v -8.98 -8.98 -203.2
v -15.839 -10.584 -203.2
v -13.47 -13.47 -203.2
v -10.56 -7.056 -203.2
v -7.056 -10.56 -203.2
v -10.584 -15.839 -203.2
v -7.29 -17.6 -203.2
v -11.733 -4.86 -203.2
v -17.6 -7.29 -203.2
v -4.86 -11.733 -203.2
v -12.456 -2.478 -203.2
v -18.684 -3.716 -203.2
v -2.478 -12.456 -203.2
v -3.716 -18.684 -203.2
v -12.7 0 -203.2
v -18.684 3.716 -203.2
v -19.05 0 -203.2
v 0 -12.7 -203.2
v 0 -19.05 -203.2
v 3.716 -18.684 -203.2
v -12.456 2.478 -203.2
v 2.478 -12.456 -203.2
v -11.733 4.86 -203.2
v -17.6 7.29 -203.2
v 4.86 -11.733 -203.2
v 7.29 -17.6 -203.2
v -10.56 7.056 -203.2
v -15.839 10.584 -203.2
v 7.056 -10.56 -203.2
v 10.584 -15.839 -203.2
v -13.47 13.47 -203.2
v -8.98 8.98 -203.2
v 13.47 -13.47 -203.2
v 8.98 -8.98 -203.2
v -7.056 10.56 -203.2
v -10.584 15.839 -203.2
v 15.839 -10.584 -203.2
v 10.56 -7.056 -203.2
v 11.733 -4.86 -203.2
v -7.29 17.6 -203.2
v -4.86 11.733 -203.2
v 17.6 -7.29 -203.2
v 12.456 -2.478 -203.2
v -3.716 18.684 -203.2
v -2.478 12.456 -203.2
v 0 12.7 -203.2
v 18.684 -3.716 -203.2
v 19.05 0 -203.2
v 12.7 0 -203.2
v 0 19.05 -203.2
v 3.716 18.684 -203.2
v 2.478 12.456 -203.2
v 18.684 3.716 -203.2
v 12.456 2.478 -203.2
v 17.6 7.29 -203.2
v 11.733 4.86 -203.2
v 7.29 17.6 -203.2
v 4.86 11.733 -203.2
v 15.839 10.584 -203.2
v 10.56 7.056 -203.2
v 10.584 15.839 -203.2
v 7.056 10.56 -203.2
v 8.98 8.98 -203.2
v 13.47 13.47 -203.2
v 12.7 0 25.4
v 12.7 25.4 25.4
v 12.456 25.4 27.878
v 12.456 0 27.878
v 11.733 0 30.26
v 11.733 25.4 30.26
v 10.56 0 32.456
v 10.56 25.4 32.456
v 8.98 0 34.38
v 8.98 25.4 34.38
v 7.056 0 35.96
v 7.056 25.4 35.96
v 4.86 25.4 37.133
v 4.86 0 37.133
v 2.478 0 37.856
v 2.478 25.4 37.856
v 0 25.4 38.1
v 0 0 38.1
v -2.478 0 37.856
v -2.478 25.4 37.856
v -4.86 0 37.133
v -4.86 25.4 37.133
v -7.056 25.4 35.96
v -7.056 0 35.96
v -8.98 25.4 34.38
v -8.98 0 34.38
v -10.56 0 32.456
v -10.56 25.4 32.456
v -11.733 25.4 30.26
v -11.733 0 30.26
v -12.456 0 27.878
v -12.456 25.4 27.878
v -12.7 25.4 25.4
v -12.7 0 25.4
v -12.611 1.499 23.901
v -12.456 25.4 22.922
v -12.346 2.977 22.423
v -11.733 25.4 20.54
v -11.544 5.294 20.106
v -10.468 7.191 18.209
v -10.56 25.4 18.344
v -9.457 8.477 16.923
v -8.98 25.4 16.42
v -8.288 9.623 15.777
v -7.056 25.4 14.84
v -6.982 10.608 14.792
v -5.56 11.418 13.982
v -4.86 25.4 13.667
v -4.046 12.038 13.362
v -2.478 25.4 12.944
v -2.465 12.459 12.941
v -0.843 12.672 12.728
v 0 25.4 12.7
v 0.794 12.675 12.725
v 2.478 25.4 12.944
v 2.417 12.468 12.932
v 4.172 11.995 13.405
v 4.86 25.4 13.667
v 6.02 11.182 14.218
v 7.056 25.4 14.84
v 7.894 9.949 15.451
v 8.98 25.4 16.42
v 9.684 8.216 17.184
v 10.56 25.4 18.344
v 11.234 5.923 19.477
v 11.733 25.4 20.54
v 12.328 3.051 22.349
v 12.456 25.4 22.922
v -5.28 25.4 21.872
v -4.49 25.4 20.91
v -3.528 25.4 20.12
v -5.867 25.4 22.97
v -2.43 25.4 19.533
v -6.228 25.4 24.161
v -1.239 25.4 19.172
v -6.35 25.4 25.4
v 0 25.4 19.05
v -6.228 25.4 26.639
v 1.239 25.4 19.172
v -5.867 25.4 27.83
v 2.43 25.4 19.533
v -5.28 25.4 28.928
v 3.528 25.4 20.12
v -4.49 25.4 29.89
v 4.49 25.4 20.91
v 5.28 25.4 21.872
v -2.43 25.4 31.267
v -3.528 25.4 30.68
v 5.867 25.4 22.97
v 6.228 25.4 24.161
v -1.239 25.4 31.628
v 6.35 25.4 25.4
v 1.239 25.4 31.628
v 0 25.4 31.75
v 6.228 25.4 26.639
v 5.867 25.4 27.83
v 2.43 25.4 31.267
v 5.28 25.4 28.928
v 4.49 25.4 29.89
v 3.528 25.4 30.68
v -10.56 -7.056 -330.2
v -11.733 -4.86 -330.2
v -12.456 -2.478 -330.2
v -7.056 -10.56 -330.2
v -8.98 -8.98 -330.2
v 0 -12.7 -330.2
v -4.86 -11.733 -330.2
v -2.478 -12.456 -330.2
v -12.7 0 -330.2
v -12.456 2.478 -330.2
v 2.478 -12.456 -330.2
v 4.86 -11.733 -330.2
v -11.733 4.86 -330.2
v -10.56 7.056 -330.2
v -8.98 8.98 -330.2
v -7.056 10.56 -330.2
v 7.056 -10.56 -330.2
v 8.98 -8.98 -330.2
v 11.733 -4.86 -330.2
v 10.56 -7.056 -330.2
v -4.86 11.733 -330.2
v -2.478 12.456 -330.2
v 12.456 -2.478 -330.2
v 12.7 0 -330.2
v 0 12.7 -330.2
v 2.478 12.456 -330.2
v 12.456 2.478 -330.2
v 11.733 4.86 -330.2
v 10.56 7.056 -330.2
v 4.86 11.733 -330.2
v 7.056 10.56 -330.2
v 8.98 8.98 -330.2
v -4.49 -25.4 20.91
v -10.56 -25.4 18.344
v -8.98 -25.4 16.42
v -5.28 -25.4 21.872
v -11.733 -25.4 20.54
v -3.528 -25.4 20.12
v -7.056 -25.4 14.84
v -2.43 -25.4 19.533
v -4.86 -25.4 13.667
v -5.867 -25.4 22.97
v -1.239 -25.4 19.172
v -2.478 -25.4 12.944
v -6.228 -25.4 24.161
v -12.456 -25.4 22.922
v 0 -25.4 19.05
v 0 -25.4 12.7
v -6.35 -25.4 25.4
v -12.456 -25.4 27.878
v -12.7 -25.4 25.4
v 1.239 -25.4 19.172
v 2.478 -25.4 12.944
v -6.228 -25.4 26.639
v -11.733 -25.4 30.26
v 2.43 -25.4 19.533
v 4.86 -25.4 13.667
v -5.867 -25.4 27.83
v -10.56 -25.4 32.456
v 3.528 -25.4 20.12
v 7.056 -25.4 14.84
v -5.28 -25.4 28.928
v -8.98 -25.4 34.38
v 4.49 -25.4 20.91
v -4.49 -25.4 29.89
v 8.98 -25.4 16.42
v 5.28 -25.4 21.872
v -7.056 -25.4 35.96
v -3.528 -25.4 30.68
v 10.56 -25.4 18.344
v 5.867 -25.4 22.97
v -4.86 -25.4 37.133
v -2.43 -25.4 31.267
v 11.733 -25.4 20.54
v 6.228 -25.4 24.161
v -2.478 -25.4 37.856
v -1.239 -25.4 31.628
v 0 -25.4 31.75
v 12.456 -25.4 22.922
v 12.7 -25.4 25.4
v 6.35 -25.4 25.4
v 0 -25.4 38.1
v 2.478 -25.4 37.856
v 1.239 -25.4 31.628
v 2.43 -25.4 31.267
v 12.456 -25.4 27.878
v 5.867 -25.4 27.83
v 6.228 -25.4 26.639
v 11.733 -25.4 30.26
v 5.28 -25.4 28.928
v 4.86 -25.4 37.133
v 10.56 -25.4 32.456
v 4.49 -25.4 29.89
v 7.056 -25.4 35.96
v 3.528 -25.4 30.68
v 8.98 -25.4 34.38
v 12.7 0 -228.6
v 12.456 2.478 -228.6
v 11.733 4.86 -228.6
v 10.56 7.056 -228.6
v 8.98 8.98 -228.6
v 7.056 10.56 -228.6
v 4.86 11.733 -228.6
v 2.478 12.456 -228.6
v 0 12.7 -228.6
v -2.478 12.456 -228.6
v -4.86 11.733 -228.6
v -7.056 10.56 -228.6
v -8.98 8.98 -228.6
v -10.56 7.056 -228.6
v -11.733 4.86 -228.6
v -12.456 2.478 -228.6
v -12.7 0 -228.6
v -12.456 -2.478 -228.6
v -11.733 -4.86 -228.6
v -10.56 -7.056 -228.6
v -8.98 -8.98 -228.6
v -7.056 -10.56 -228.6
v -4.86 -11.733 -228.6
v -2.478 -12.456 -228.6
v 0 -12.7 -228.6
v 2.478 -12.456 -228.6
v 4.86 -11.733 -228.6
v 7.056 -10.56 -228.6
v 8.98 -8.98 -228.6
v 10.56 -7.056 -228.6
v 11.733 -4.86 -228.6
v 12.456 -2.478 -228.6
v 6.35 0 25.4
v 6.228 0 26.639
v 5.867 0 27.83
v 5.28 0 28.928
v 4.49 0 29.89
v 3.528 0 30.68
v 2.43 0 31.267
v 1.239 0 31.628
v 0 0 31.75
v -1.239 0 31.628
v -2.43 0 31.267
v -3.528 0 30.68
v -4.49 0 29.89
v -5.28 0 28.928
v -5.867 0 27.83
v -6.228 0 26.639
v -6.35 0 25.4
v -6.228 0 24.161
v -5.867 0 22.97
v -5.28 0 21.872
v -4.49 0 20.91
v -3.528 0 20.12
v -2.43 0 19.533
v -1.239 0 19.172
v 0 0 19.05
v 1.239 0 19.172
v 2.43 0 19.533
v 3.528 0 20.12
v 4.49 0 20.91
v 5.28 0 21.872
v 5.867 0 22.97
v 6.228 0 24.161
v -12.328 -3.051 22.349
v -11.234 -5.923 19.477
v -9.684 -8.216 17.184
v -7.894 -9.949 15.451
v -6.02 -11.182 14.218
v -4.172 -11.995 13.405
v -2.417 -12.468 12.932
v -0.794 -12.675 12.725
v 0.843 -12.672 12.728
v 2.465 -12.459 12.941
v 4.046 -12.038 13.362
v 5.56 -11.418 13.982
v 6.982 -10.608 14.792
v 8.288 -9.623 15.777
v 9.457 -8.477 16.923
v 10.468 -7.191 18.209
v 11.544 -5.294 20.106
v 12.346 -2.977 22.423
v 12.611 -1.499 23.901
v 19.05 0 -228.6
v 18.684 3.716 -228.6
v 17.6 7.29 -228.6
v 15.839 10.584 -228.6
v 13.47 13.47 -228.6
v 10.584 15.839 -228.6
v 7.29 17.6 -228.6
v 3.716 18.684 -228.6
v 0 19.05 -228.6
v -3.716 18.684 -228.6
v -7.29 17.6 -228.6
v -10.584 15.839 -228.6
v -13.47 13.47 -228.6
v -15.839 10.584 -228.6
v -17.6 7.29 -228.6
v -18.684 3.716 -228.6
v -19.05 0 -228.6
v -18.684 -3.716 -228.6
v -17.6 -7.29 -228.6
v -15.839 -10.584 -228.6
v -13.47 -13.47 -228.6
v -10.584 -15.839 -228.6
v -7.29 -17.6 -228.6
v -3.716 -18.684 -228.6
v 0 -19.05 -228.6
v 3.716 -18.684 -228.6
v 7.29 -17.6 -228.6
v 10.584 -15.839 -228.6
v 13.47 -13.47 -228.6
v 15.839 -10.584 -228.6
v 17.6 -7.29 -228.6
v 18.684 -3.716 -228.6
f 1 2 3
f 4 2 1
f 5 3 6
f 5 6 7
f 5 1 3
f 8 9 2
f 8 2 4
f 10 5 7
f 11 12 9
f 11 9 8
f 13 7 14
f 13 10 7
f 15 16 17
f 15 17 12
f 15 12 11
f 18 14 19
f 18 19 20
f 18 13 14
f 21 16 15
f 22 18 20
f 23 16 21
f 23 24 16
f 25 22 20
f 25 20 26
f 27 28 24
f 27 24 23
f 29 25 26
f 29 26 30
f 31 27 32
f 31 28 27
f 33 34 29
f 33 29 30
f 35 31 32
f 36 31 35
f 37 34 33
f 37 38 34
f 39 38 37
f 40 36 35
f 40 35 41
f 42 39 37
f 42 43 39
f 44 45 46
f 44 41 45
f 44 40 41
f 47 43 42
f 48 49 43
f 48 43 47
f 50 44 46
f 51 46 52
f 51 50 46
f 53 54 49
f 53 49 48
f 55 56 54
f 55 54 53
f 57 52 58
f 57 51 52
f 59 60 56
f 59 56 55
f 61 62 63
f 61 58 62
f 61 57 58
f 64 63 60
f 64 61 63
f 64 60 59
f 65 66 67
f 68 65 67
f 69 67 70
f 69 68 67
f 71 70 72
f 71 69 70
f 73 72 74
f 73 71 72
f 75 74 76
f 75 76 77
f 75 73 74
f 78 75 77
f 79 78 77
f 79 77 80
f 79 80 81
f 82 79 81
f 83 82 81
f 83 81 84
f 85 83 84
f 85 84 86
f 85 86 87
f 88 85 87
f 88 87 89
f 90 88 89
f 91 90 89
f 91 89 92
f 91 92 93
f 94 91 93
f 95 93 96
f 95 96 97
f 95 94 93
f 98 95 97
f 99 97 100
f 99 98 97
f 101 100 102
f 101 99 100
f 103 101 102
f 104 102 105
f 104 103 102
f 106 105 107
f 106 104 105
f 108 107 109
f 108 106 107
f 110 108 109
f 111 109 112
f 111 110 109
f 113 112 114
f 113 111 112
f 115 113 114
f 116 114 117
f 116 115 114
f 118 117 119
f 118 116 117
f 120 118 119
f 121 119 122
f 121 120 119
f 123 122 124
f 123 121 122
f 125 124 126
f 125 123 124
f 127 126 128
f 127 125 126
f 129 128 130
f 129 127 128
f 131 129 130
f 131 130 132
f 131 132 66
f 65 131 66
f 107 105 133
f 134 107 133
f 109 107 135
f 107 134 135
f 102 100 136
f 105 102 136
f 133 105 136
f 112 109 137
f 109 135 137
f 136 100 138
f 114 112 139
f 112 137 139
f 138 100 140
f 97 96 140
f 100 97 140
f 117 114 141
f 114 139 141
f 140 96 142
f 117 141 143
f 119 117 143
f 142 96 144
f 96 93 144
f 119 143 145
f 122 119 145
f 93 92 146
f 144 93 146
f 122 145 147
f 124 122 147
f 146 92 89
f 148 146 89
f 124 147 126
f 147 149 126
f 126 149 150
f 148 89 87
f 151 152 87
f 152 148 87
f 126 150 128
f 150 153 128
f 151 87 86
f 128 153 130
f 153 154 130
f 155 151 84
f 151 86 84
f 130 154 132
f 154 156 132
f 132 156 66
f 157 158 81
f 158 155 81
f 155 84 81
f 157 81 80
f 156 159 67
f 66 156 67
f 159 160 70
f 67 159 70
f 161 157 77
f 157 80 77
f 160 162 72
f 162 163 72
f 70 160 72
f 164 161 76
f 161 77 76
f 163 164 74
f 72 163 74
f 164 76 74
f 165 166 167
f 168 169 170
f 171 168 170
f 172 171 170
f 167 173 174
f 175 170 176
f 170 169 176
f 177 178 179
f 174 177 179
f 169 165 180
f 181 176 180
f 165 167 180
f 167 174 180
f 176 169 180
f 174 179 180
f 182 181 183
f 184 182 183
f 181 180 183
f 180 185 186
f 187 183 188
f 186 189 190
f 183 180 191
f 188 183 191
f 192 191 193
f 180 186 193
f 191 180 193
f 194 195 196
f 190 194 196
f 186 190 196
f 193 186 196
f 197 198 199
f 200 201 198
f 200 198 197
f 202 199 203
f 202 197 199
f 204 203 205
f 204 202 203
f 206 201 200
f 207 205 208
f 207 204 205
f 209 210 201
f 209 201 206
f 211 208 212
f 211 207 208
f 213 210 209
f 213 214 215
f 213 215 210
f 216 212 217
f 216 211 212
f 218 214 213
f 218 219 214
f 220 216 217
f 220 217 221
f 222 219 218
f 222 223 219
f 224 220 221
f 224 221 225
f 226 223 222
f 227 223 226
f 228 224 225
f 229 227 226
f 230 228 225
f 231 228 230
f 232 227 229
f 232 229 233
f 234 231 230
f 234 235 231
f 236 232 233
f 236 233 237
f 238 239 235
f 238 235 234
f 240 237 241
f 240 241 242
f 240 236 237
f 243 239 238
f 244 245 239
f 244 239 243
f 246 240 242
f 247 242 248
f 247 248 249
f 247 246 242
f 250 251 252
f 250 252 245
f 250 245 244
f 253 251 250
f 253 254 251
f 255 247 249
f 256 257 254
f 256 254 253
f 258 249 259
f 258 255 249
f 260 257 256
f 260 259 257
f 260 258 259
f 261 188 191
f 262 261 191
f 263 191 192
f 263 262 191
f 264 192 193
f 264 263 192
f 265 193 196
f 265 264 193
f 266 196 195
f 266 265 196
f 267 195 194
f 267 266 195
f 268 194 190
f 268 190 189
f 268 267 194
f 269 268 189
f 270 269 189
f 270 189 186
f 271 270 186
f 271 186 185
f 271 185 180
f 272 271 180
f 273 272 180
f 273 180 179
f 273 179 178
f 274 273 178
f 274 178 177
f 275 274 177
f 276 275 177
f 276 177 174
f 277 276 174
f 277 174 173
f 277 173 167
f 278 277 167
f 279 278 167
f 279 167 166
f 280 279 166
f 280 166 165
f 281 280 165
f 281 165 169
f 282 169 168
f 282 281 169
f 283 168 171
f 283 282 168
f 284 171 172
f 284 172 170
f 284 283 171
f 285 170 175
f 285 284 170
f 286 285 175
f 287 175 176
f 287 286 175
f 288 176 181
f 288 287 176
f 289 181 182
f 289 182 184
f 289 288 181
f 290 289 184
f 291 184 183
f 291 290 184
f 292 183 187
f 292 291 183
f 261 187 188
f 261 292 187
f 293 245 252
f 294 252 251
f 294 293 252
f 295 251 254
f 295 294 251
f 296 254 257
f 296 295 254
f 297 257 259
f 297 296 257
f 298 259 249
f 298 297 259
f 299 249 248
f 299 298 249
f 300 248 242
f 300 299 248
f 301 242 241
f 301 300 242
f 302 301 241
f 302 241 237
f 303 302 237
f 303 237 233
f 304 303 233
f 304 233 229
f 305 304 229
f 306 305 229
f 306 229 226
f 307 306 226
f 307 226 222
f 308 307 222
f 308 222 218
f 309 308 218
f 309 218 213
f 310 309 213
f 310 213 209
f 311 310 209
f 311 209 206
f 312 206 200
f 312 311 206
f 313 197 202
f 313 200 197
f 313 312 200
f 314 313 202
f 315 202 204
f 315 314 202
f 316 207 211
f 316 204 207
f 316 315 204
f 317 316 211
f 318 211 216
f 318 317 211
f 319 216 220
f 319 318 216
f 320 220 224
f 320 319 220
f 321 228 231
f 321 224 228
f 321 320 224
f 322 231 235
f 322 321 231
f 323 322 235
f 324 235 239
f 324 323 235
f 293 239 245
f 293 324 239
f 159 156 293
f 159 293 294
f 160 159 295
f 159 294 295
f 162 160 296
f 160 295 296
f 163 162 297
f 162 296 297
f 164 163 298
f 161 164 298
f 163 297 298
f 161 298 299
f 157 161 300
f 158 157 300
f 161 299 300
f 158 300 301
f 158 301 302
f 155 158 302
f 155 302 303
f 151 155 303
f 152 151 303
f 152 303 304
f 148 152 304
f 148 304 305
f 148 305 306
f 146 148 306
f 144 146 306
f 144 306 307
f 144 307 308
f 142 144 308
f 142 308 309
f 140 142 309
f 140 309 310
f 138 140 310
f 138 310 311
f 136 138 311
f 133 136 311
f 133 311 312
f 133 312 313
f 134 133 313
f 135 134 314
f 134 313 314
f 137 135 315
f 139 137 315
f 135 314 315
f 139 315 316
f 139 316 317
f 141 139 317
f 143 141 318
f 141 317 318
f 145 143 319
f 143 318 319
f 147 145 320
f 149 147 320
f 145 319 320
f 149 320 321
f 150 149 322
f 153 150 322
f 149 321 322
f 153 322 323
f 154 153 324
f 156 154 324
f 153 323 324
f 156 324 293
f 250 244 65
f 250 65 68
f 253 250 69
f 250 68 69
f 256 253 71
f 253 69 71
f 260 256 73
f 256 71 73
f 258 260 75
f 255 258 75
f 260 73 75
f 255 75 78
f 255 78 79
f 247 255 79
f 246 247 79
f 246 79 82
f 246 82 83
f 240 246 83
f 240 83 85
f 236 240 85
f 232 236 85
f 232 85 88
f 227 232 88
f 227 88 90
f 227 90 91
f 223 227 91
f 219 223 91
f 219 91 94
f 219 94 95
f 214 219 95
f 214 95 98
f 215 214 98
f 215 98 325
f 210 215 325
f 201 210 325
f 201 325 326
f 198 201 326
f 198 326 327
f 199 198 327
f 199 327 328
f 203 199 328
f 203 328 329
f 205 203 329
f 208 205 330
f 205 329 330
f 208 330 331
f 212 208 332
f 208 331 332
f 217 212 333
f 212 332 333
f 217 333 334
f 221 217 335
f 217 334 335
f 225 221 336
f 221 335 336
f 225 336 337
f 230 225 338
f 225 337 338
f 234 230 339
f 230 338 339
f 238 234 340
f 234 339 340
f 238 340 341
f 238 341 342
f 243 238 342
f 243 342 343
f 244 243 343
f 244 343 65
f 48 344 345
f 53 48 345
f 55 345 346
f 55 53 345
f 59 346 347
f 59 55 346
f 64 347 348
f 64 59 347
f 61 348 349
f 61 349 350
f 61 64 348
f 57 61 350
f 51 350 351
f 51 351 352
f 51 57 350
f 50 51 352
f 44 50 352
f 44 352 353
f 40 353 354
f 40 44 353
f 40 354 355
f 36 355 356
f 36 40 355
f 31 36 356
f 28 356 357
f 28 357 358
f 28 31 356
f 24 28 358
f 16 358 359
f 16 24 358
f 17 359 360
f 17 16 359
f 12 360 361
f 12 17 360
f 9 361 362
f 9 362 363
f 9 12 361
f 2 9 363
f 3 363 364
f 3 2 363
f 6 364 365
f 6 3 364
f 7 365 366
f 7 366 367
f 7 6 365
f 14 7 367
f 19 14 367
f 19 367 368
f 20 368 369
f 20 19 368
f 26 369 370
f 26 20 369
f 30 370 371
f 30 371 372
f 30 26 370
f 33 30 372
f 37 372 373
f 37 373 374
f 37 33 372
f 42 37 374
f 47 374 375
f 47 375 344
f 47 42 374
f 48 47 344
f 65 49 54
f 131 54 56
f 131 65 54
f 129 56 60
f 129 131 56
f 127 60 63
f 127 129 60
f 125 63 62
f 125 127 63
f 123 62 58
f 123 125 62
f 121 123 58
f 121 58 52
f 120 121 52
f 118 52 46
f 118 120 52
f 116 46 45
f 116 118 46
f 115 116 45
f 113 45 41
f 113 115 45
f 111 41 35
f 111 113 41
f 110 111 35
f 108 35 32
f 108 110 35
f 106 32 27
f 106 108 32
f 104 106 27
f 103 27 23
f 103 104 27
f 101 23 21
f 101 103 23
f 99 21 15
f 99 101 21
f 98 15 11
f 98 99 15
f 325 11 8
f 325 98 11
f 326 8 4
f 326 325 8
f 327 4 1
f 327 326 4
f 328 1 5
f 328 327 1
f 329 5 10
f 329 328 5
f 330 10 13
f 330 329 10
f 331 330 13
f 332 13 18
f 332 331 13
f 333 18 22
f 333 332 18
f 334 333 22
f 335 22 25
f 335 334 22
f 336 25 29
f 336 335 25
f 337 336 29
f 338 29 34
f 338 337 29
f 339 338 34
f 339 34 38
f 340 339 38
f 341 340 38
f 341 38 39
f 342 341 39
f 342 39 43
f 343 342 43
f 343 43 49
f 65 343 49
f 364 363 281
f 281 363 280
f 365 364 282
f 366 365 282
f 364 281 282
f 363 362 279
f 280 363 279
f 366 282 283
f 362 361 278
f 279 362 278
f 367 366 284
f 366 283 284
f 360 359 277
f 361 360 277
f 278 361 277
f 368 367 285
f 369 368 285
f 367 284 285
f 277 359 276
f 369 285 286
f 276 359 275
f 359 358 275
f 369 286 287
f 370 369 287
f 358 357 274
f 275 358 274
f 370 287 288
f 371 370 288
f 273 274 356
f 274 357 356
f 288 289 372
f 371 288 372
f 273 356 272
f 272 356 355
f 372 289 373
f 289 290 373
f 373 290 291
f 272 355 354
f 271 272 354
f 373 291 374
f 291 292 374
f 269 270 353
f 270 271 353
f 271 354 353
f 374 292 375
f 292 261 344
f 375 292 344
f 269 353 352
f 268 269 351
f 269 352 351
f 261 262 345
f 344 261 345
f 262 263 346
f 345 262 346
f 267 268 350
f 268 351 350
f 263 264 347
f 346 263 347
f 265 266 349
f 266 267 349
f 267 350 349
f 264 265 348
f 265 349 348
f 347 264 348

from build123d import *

# Parameters (mm, degrees)
F0_R          = 12.7
F1_DEPTH      = 330.2
F1_DEPTH_BACK = 25.4
F3_R          = 19.05
F4_DEPTH      = 25.4
F5_R          = 12.7
F6_DEPTH      = 25.4
F6_DEPTH_BACK = 25.4
F7_R          = 6.35
F8_DEPTH      = 25.401
F8_DEPTH_BACK = 25.401


with BuildPart() as f1:
    # F0 (on Top) → F1 (new body, two sides)
    with BuildSketch(Plane.XY) as f1_sk:
        Circle(F0_R)
    extrude(amount=-F1_DEPTH)
    extrude(f1_sk.sketch, amount=F1_DEPTH_BACK)

    # F3 (on offset) → F4 (join)
    with BuildSketch(Plane.XY.offset(-203.2)):
        Circle(F3_R)
    extrude(amount=-F4_DEPTH)

    # F5 (on Front) → F6 (join, two sides)
    with BuildSketch(Plane.XZ) as f6_sk:
        with Locations((0, 25.4)):
            Circle(F5_R)
    extrude(amount=F6_DEPTH)
    extrude(f6_sk.sketch, amount=-F6_DEPTH_BACK)

    # F7 (on Front) → F8 (cut, two sides)
    with BuildSketch(Plane.XZ) as f8_sk:
        with Locations((0, 25.4)):
            Circle(F7_R)
    extrude(amount=-F8_DEPTH, mode=Mode.SUBTRACT)
    extrude(f8_sk.sketch, amount=F8_DEPTH_BACK, mode=Mode.SUBTRACT)


solid = f1.part
